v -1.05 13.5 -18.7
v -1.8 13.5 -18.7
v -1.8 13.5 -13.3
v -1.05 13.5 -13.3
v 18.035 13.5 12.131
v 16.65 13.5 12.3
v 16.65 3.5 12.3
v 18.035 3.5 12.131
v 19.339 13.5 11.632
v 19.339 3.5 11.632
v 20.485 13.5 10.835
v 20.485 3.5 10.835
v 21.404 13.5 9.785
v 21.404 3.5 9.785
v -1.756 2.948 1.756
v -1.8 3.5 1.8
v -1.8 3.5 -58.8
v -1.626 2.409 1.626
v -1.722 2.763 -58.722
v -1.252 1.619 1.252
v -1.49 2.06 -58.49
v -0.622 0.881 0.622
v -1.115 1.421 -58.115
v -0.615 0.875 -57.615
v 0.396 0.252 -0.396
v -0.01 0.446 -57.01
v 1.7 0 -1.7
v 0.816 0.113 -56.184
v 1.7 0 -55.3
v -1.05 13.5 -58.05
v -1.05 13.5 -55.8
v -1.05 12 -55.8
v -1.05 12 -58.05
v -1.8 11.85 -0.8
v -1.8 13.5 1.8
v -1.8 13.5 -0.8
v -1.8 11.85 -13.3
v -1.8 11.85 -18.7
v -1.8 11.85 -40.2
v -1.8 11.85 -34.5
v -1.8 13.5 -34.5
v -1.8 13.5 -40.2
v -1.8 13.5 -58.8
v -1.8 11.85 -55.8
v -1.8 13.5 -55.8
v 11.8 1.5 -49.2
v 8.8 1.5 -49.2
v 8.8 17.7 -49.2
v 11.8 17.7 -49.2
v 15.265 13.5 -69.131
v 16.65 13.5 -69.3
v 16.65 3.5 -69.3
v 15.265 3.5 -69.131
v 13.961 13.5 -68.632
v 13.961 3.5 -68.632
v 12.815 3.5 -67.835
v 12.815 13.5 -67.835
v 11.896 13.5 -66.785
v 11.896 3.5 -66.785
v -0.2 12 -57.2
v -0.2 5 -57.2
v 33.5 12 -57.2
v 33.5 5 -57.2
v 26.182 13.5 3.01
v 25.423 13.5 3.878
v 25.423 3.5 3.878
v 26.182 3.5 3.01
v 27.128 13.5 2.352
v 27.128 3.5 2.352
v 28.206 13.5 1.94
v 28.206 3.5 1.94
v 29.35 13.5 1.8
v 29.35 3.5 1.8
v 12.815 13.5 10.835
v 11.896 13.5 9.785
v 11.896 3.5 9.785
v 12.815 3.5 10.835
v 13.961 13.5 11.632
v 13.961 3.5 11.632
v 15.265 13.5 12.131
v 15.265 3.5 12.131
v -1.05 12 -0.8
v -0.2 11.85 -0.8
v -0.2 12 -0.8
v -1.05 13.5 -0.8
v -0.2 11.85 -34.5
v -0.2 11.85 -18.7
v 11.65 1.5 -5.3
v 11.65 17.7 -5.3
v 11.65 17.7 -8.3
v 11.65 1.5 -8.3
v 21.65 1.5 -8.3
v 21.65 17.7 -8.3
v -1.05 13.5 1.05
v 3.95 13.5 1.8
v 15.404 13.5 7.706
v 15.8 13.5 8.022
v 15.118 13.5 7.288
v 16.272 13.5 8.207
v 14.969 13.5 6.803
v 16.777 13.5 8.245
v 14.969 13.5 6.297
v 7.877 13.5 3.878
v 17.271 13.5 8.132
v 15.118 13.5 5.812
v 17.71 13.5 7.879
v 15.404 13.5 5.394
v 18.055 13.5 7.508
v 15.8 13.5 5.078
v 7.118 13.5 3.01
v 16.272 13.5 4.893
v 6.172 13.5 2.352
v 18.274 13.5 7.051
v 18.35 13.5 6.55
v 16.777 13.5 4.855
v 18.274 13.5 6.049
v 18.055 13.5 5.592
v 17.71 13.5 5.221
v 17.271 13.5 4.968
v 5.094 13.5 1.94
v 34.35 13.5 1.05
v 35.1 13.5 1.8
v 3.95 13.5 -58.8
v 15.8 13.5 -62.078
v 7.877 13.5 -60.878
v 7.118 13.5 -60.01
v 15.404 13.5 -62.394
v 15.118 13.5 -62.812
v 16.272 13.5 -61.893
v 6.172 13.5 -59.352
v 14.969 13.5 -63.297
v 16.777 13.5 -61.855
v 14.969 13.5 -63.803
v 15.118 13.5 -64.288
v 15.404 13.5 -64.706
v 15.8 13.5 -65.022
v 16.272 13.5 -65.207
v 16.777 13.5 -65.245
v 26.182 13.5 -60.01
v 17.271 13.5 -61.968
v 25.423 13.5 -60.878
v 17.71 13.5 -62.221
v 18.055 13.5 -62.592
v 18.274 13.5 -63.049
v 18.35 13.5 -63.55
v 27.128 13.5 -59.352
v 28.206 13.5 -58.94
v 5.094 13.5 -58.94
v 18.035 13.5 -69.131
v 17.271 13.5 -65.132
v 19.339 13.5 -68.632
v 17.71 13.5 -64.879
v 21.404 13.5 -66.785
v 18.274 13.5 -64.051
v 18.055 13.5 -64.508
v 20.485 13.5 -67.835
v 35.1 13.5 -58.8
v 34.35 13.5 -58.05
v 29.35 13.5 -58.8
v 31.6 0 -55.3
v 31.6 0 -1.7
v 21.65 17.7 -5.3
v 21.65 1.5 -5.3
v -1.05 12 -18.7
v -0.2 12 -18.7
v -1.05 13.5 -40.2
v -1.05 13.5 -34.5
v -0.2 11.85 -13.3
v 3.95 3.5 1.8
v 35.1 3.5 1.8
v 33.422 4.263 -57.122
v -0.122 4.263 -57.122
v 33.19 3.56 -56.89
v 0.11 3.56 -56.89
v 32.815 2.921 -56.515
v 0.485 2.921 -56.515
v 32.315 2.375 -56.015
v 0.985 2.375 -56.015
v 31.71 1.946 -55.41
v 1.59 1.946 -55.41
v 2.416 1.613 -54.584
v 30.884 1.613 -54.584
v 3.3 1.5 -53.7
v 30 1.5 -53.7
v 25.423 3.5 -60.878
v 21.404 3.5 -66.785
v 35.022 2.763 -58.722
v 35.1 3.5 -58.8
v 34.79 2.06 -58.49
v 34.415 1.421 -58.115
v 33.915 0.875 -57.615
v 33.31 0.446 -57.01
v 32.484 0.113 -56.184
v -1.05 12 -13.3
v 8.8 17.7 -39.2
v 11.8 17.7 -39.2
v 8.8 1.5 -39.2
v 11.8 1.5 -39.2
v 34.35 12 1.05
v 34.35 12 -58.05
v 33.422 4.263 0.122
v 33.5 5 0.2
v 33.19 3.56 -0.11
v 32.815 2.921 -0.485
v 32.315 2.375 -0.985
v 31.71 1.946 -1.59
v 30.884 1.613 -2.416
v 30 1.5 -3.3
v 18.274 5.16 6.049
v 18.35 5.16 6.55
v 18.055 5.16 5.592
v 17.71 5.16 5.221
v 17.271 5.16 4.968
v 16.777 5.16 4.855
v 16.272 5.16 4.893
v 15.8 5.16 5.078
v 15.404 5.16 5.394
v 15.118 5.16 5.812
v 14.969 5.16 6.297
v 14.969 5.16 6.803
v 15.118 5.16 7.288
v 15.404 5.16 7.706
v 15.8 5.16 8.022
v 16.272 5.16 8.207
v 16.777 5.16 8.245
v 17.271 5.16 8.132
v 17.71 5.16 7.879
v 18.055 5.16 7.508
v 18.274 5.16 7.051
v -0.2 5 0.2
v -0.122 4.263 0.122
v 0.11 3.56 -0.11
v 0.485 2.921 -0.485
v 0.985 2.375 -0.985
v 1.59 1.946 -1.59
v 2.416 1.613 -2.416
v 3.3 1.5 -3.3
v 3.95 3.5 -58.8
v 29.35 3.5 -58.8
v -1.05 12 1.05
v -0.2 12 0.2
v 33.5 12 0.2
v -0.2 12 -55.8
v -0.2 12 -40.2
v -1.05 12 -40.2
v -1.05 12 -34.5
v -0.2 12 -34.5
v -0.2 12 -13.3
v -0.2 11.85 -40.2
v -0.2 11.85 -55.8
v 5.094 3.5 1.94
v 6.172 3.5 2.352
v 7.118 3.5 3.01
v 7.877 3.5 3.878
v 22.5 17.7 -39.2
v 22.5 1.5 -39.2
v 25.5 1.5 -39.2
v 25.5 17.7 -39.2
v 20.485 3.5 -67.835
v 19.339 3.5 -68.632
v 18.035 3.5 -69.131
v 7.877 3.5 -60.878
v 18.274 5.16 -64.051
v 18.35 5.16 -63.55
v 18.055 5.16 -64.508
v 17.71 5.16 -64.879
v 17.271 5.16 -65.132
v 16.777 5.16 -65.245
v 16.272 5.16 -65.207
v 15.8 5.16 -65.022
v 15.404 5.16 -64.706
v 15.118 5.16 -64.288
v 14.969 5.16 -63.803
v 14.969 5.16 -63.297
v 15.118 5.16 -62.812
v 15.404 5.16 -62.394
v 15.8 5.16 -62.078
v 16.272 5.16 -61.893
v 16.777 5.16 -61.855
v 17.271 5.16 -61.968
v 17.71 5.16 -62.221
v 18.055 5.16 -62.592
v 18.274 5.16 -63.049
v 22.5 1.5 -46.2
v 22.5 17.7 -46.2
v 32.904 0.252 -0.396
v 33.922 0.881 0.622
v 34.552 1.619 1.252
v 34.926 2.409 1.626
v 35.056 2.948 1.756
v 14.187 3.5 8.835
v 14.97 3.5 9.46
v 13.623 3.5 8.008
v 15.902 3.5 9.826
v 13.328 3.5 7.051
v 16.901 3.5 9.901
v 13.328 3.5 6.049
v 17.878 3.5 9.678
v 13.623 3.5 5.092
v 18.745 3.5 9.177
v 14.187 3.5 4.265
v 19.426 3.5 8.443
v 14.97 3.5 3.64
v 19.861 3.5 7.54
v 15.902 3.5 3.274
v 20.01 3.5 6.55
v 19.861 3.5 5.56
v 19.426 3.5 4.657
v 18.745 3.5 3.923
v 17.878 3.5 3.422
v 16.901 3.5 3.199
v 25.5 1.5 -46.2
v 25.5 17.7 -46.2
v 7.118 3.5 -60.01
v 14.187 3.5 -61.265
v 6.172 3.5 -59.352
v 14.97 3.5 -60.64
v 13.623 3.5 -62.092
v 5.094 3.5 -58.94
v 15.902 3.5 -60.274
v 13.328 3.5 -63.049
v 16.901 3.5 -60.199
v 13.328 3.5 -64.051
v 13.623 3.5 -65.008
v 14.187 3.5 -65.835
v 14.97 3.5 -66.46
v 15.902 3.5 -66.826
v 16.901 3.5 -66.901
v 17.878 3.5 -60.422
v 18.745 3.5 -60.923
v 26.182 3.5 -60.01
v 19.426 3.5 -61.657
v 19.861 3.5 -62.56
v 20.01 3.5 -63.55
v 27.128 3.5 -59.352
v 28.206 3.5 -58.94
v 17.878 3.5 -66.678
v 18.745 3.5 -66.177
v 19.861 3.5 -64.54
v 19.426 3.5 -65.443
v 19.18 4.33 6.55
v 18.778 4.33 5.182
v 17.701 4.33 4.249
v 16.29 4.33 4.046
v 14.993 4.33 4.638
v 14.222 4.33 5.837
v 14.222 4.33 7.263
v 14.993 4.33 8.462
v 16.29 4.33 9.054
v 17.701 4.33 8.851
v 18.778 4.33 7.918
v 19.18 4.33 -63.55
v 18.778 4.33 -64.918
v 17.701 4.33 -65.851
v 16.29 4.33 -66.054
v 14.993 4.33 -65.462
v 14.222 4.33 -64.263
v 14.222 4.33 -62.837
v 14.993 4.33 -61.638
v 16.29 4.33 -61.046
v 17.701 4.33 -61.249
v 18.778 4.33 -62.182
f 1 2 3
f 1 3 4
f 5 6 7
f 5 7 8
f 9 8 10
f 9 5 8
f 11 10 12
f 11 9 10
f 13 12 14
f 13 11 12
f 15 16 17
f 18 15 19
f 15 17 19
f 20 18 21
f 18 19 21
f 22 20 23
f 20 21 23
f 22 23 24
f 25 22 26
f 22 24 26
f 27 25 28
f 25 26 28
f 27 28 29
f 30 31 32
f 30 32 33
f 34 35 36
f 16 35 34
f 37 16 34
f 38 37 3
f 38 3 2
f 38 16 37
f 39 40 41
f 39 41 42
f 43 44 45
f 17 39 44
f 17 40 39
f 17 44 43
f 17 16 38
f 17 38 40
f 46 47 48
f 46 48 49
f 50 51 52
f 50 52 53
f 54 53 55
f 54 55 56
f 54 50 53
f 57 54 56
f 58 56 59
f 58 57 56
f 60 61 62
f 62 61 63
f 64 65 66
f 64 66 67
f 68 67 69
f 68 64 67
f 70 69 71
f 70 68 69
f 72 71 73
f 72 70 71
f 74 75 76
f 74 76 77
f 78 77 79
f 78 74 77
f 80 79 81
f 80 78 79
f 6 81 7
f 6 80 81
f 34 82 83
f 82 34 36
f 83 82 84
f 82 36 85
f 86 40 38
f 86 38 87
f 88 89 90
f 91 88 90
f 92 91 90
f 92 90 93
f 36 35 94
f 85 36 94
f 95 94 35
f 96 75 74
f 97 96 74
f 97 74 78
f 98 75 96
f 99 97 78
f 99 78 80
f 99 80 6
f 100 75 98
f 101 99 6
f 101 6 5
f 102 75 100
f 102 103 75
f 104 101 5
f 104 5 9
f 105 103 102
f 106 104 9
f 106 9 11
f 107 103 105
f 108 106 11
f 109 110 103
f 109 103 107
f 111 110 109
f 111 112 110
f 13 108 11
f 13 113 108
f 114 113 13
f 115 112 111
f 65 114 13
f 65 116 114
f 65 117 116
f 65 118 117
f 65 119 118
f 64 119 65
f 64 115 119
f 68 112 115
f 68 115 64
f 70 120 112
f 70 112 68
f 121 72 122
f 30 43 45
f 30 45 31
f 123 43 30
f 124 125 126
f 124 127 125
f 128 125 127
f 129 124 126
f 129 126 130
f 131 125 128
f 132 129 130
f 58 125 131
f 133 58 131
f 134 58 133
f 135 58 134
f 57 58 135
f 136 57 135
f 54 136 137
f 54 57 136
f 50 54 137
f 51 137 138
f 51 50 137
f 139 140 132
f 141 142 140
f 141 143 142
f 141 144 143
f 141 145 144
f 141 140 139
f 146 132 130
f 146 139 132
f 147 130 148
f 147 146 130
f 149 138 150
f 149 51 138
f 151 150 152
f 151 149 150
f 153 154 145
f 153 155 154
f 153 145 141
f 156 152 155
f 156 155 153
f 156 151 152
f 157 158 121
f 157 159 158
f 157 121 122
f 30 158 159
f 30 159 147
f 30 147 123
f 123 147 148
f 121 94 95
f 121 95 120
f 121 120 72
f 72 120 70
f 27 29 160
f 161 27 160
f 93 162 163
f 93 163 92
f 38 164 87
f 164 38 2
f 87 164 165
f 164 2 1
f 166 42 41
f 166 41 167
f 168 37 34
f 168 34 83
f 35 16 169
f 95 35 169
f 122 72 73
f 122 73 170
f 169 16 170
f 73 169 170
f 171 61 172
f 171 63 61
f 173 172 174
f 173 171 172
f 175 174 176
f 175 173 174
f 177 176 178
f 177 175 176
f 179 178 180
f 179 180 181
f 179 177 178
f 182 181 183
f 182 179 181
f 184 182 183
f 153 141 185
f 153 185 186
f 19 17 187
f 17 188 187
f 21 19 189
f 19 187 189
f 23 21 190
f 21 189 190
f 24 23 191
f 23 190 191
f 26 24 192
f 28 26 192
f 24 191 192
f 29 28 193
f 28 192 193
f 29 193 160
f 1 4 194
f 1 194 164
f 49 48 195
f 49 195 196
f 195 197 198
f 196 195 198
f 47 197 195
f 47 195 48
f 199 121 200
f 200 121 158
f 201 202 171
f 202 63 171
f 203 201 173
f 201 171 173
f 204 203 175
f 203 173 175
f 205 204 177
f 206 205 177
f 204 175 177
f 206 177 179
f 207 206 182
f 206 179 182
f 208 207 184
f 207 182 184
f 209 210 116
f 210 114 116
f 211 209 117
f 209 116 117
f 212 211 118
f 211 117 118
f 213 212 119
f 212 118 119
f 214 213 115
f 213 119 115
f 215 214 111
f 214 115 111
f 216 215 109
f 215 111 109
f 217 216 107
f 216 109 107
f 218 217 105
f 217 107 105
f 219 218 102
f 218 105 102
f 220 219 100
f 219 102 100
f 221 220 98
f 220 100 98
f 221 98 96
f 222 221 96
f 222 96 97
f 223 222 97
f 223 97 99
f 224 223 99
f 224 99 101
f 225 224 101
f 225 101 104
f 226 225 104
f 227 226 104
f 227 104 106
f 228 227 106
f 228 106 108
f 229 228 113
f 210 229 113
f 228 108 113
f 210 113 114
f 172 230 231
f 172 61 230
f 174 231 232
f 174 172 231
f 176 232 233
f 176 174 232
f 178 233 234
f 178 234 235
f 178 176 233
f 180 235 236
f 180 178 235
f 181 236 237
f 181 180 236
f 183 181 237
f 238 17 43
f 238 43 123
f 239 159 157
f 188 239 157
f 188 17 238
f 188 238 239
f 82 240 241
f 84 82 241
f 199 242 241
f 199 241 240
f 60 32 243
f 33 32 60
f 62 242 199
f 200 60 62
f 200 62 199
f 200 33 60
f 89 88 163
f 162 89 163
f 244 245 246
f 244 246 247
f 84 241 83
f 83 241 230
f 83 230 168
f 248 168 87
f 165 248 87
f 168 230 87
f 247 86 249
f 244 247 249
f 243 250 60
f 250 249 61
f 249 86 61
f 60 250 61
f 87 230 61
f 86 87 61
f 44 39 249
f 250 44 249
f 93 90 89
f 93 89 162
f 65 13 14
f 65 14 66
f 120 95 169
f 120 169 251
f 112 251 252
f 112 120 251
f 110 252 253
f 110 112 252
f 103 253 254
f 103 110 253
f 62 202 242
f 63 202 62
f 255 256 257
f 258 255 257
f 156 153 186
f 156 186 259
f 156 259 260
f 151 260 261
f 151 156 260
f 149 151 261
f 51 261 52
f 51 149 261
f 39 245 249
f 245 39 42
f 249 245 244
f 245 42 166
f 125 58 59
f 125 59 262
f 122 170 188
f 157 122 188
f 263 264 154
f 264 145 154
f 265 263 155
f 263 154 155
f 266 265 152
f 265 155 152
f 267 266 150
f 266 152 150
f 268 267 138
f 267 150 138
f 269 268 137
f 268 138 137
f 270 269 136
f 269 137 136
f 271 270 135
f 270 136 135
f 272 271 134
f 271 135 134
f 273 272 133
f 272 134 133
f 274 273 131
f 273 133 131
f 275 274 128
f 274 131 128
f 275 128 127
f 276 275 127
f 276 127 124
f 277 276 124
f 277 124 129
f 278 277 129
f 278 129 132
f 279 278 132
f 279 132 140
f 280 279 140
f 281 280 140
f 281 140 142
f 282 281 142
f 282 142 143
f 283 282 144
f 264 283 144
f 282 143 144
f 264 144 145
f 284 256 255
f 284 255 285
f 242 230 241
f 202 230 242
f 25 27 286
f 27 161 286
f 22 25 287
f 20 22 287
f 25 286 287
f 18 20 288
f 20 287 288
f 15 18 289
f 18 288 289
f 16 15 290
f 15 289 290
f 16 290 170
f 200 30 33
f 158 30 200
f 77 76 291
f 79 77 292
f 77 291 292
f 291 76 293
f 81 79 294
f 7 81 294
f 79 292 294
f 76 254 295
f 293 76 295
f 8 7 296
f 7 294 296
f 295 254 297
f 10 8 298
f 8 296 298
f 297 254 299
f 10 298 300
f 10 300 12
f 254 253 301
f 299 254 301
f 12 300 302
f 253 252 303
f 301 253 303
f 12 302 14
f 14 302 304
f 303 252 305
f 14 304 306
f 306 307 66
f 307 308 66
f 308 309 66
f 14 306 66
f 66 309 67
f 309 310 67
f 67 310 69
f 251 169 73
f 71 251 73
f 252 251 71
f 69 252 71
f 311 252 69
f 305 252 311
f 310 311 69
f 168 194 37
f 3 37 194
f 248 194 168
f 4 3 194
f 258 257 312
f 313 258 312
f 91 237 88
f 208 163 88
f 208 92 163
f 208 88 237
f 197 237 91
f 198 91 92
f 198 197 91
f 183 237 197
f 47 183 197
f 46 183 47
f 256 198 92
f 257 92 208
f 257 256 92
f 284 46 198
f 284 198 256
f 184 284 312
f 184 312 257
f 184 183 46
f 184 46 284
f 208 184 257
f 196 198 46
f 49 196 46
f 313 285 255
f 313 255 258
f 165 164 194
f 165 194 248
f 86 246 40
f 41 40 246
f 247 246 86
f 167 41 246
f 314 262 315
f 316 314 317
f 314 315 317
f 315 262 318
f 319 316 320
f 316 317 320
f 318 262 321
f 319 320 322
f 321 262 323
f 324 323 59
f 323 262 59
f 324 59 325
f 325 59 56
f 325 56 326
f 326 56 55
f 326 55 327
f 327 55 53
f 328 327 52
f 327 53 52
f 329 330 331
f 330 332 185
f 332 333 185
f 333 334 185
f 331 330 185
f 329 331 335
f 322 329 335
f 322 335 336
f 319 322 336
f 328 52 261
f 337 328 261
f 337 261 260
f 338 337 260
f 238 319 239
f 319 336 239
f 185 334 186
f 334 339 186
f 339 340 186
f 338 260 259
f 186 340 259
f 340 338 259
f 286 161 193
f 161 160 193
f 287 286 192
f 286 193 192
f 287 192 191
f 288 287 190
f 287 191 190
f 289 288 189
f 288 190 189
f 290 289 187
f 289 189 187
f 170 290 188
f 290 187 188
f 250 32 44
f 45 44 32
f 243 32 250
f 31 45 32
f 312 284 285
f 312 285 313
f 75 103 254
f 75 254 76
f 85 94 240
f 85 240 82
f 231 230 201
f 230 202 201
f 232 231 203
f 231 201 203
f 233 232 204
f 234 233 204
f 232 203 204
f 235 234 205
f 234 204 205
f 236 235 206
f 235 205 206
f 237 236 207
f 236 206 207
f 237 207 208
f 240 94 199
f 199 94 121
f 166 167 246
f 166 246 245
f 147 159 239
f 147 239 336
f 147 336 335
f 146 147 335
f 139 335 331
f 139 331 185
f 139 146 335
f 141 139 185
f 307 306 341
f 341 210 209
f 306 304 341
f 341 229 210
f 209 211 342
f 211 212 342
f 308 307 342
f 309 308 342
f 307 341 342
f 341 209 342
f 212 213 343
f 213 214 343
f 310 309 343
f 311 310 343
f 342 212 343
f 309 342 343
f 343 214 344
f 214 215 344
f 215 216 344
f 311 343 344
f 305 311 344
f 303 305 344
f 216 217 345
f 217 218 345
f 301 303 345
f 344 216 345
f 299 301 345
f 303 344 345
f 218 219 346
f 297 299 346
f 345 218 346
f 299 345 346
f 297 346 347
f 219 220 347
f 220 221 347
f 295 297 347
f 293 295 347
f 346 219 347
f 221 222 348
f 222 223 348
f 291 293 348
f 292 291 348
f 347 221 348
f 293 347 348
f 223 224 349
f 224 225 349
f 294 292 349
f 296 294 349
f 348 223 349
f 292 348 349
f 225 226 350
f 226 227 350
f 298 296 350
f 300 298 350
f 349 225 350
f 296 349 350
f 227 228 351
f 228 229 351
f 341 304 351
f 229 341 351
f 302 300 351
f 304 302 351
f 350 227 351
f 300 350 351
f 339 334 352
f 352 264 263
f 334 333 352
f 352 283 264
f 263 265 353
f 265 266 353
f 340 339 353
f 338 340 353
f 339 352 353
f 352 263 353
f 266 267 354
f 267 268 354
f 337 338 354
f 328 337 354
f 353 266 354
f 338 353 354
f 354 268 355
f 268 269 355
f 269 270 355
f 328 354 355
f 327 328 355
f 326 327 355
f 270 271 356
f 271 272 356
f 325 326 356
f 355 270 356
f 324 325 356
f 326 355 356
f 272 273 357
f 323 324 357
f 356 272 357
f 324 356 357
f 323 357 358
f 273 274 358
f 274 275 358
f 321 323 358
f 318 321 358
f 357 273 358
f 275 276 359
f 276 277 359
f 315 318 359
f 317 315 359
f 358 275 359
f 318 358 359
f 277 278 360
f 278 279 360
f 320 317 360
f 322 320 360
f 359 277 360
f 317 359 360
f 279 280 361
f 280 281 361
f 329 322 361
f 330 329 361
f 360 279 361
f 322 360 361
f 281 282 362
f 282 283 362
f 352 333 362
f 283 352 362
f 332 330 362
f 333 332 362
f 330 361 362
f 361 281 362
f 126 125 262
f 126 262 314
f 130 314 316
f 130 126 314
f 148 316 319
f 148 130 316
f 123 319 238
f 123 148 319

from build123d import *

# Parameters (mm, degrees)
SKETCH_2_W                  = 36.9
SKETCH_2_H                  = 60.6
SKETCH_2_W_2                = 33.7
SKETCH_2_H_2                = 57.4
SKETCH_2_W_3                = 35.4
SKETCH_2_H_3                = 59.1
SKETCH_2_R                  = 3.75
SKETCH_2_R_2                = 2.25
SKETCH_2_R_3                = 0.75
EXTRUDE_1_DEPTH             = 1.5
EXTRUDE_START               = 1.5
SKETCH_2_20_W               = 36.9
SKETCH_2_20_H               = 60.6
SKETCH_2_20_W_2             = 35.4
SKETCH_2_20_H_2             = 59.1
SKETCH_2_20_W_3             = 33.7
SKETCH_2_20_H_3             = 57.4
EXTRUDE_9_DEPTH             = 12
CUT_EXTRUDE_START           = 13.5
SKETCH_2_21_W               = 35.4
SKETCH_2_21_H               = 59.1
SKETCH_2_21_W_2             = 33.7
SKETCH_2_21_H_2             = 57.4
CUT_EXTRUDE_3_DEPTH         = 1.5
EXTRUDE_START_2             = 13.5
SKETCH_2_23_R               = 3
SKETCH_2_23_R_2             = 1.6
EXTRUDE_10_DEPTH            = 10
FILLET_2_R                  = 3.5
HOLE_WIZARD_M32_D           = 3.4
HOLE_WIZARD_M32_CSINK_D     = 6.72
HOLE_WIZARD_M32_CSINK_ANGLE = 90
SKETCH_12_W                 = 1.6
SKETCH_12_H                 = 15.6
SKETCH_12_H_2               = 15.8
SKETCH_12_H_3               = 12.5
CUT_EXTRUDE_4_DEPTH         = 1.65
SKETCH_13_W                 = 3
SKETCH_13_H                 = 10
SKETCH_13_H_2               = 7
SKETCH_13_W_2               = 10
SKETCH_13_H_3               = 3
EXTRUDE_11_DEPTH            = 16.2


with BuildPart() as part:
    # Эскиз2 → Бобышка-Вытянуть1 (new body)
    # profile 1 of 15: a face of its own
    with BuildSketch(Plane(origin=(0, 0, 0), x_dir=(1, 0, 0), z_dir=(0, 1, 0))):
        with Locations((16.65, 28.5)):
            Rectangle(SKETCH_2_W, SKETCH_2_H)
        with Locations((16.65, 28.5)):
            Rectangle(SKETCH_2_W_2, SKETCH_2_H_2, mode=Mode.SUBTRACT)
    # profile 2 of 15: a face of its own
    with BuildSketch(Plane(origin=(0, 0, 0), x_dir=(1, 0, 0), z_dir=(0, 1, 0))):
        with Locations((16.65, 28.5)):
            Rectangle(SKETCH_2_W_3, SKETCH_2_H_3)
        with Locations((16.65, 28.5)):
            Rectangle(SKETCH_2_W_2, SKETCH_2_H_2, mode=Mode.SUBTRACT)
    # profile 3 of 15: a face of its own
    with BuildSketch(Plane(origin=(0, 0, 0), x_dir=(1, 0, 0), z_dir=(0, 1, 0))):
        with BuildLine():
            Line((-0.2, 57.2), (-0.2, -0.2))
            Line((-0.2, -0.2), (33.5, -0.2))
            Line((33.5, -0.2), (33.5, 10.050490243))
            ThreePointArc((33.5, 10.050490243), (27, 12.6), (33.5, 15.149509757))
            Line((33.5, 15.149509757), (33.5, 57.2))
            Line((33.5, 57.2), (-0.2, 57.2))
        make_face()
        with Locations((5.1, 19.73)):
            Circle(SKETCH_2_R, mode=Mode.SUBTRACT)
        with Locations((5.1, 41.13)):
            Circle(SKETCH_2_R, mode=Mode.SUBTRACT)
        with Locations((23.55, 45)):
            Circle(SKETCH_2_R, mode=Mode.SUBTRACT)
    # profile 4 of 15: a face of its own
    with BuildSketch(Plane(origin=(0, 0, 0), x_dir=(1, 0, 0), z_dir=(0, 1, 0))):
        with Locations((23.55, 45)):
            Circle(SKETCH_2_R)
        with Locations((23.55, 45)):
            Circle(SKETCH_2_R_2, mode=Mode.SUBTRACT)
    # profile 5 of 15: a face of its own
    with BuildSketch(Plane(origin=(0, 0, 0), x_dir=(1, 0, 0), z_dir=(0, 1, 0))):
        with Locations((23.55, 45)):
            Circle(SKETCH_2_R_2)
        with Locations((23.55, 45)):
            Circle(SKETCH_2_R_3, mode=Mode.SUBTRACT)
    # profile 6 of 15: a face of its own
    with BuildSketch(Plane(origin=(0, 0, 0), x_dir=(1, 0, 0), z_dir=(0, 1, 0))):
        with Locations((23.55, 45)):
            Circle(SKETCH_2_R_3)
    # profile 7 of 15: a face of its own
    with BuildSketch(Plane(origin=(0, 0, 0), x_dir=(1, 0, 0), z_dir=(0, 1, 0))):
        with Locations((5.1, 41.13)):
            Circle(SKETCH_2_R)
        with Locations((5.1, 41.13)):
            Circle(SKETCH_2_R_2, mode=Mode.SUBTRACT)
    # profile 8 of 15: a face of its own
    with BuildSketch(Plane(origin=(0, 0, 0), x_dir=(1, 0, 0), z_dir=(0, 1, 0))):
        with Locations((5.1, 41.13)):
            Circle(SKETCH_2_R_2)
        with Locations((5.1, 41.13)):
            Circle(SKETCH_2_R_3, mode=Mode.SUBTRACT)
    # profile 9 of 15: a face of its own
    with BuildSketch(Plane(origin=(0, 0, 0), x_dir=(1, 0, 0), z_dir=(0, 1, 0))):
        with Locations((5.1, 41.13)):
            Circle(SKETCH_2_R_3)
    # profile 10 of 15: a face of its own
    with BuildSketch(Plane(origin=(0, 0, 0), x_dir=(1, 0, 0), z_dir=(0, 1, 0))):
        with Locations((5.1, 19.73)):
            Circle(SKETCH_2_R)
        with Locations((5.1, 19.73)):
            Circle(SKETCH_2_R_2, mode=Mode.SUBTRACT)
    # profile 11 of 15: a face of its own
    with BuildSketch(Plane(origin=(0, 0, 0), x_dir=(1, 0, 0), z_dir=(0, 1, 0))):
        with Locations((5.1, 19.73)):
            Circle(SKETCH_2_R_2)
        with Locations((5.1, 19.73)):
            Circle(SKETCH_2_R_3, mode=Mode.SUBTRACT)
    # profile 12 of 15: a face of its own
    with BuildSketch(Plane(origin=(0, 0, 0), x_dir=(1, 0, 0), z_dir=(0, 1, 0))):
        with Locations((5.1, 19.73)):
            Circle(SKETCH_2_R_3)
    # profile 13 of 15: a face of its own
    with BuildSketch(Plane(origin=(0, 0, 0), x_dir=(1, 0, 0), z_dir=(0, 1, 0))):
        with BuildLine():
            ThreePointArc((33.5, 15.149509757), (27, 12.6), (33.5, 10.050490243))
            Line((33.5, 10.050490243), (33.5, 15.149509757))
        make_face()
        with Locations((30.75, 12.6)):
            Circle(SKETCH_2_R_2, mode=Mode.SUBTRACT)
    # profile 14 of 15: a face of its own
    with BuildSketch(Plane(origin=(0, 0, 0), x_dir=(1, 0, 0), z_dir=(0, 1, 0))):
        with Locations((30.75, 12.6)):
            Circle(SKETCH_2_R_2)
        with Locations((30.75, 12.6)):
            Circle(SKETCH_2_R_3, mode=Mode.SUBTRACT)
    # profile 15 of 15: a face of its own
    with BuildSketch(Plane(origin=(0, 0, 0), x_dir=(1, 0, 0), z_dir=(0, 1, 0))):
        with Locations((30.75, 12.6)):
            Circle(SKETCH_2_R_3)
    extrude(amount=EXTRUDE_1_DEPTH)

    # Эскиз2<20> → Бобышка-Вытянуть9 (add)
    # profile 1 of 2: a face of its own
    with BuildSketch(Plane(origin=(0, 0, 0), x_dir=(1, 0, 0), z_dir=(0, 1, 0)).offset(EXTRUDE_START)):
        with Locations((16.65, 28.5)):
            Rectangle(SKETCH_2_20_W, SKETCH_2_20_H)
        with Locations((16.65, 28.5)):
            Rectangle(SKETCH_2_20_W_2, SKETCH_2_20_H_2, mode=Mode.SUBTRACT)
    # profile 2 of 2: a face of its own
    with BuildSketch(Plane(origin=(0, 0, 0), x_dir=(1, 0, 0), z_dir=(0, 1, 0)).offset(EXTRUDE_START)):
        with Locations((16.65, 28.5)):
            Rectangle(SKETCH_2_20_W_2, SKETCH_2_20_H_2)
        with Locations((16.65, 28.5)):
            Rectangle(SKETCH_2_20_W_3, SKETCH_2_20_H_3, mode=Mode.SUBTRACT)
    extrude(amount=EXTRUDE_9_DEPTH)

    # Эскиз2<21> → Вырез-Вытянуть3 (cut)
    with BuildSketch(Plane(origin=(0, 0, 0), x_dir=(1, 0, 0), z_dir=(0, 1, 0)).offset(CUT_EXTRUDE_START)):
        with Locations((16.65, 28.5)):
            Rectangle(SKETCH_2_21_W, SKETCH_2_21_H)
        with Locations((16.65, 28.5)):
            Rectangle(SKETCH_2_21_W_2, SKETCH_2_21_H_2, mode=Mode.SUBTRACT)
    extrude(amount=-CUT_EXTRUDE_3_DEPTH, mode=Mode.SUBTRACT)

    # Эскиз2<23> → Бобышка-Вытянуть10 (add)
    # profile 1 of 4: a face of its own
    with BuildSketch(Plane(origin=(0, 0, 0), x_dir=(1, 0, 0), z_dir=(0, 1, 0)).offset(EXTRUDE_START_2)):
        with BuildLine():
            ThreePointArc((7.877165354, 60.877946056), (6.171513422, 59.351502874), (3.95, 58.8))
            Line((3.95, 58.8), (29.35, 58.8))
            ThreePointArc((29.35, 58.8), (27.128486578, 59.351502874), (25.422834646, 60.877946056))
            Line((25.422834646, 60.877946056), (21.403937008, 66.784591616))
            ThreePointArc((21.403937008, 66.784591616), (19.339200458, 68.632391258), (16.65, 69.3))
            ThreePointArc((16.65, 69.3), (13.960799542, 68.632391258), (11.896062992, 66.784591616))
            Line((11.896062992, 66.784591616), (7.877165354, 60.877946056))
        make_face()
        with Locations((16.65, 63.55)):
            Circle(SKETCH_2_23_R, mode=Mode.SUBTRACT)
    # profile 2 of 4: a face of its own
    with BuildSketch(Plane(origin=(0, 0, 0), x_dir=(1, 0, 0), z_dir=(0, 1, 0)).offset(EXTRUDE_START_2)):
        with Locations((16.65, 63.55)):
            Circle(SKETCH_2_23_R)
        with Locations(Location((16.65, 63.55, 0), (0, 0, 90))):
            Circle(SKETCH_2_23_R_2, mode=Mode.SUBTRACT)
    # profile 3 of 4: a face of its own
    with BuildSketch(Plane(origin=(0, 0, 0), x_dir=(1, 0, 0), z_dir=(0, 1, 0)).offset(EXTRUDE_START_2)):
        with BuildLine():
            Line((29.35, -1.8), (3.95, -1.8))
            ThreePointArc((3.95, -1.8), (6.171513422, -2.351502874), (7.877165354, -3.877946056))
            Line((7.877165354, -3.877946056), (11.896062992, -9.784591616))
            ThreePointArc((11.896062992, -9.784591616), (13.960799542, -11.632391258), (16.65, -12.3))
            ThreePointArc((16.65, -12.3), (19.339200458, -11.632391258), (21.403937008, -9.784591616))
            Line((21.403937008, -9.784591616), (25.422834646, -3.877946056))
            ThreePointArc((25.422834646, -3.877946056), (27.128486578, -2.351502874), (29.35, -1.8))
        make_face()
        with Locations((16.65, -6.55)):
            Circle(SKETCH_2_23_R, mode=Mode.SUBTRACT)
    # profile 4 of 4: a face of its own
    with BuildSketch(Plane(origin=(0, 0, 0), x_dir=(1, 0, 0), z_dir=(0, 1, 0)).offset(EXTRUDE_START_2)):
        with Locations((16.65, -6.55)):
            Circle(SKETCH_2_23_R)
        with Locations(Location((16.65, -6.55, 0), (0, 0, 90))):
            Circle(SKETCH_2_23_R_2, mode=Mode.SUBTRACT)
    extrude(amount=-EXTRUDE_10_DEPTH)

    # Скругление2
    fillet_2_edges = [part.edges().sort_by_distance(p)[0] for p in [
        (16.65, 1.5, -57.2),
        (-0.2, 1.5, -28.5),
        (33.5, 1.5, -28.5),
        (16.65, 1.5, 0.2),
        (16.65, 0, -58.8),
        (35.1, 0, -28.5),
        (16.65, 0, 1.8),
        (-1.8, 0, -28.5),
    ]]
    fillet(fillet_2_edges, radius=FILLET_2_R - 0.0001)  # a hair under: the kernel refuses the full size

    # Зенковка для  винта с потайной головкой с внутренним шестигранником M32 (through all)
    with Locations(Plane(origin=(0, 3.5, 0), x_dir=(-1, 0, 0), z_dir=(0, -1, 0))):
        with Locations((-16.65, 63.55), (-16.65, -6.55)):
            CounterSinkHole(HOLE_WIZARD_M32_D / 2, HOLE_WIZARD_M32_CSINK_D / 2, counter_sink_angle=HOLE_WIZARD_M32_CSINK_ANGLE)

    # Эскиз12 → Вырез-Вытянуть4 (cut)
    with BuildSketch(Plane(origin=(0, 13.5, 0), x_dir=(1, 0, 0), z_dir=(0, 1, 0))):
        with Locations((-1, 48)):
            Rectangle(SKETCH_12_W, SKETCH_12_H)
        with Locations((-1, 26.6)):
            Rectangle(SKETCH_12_W, SKETCH_12_H_2)
        with Locations((-1, 7.05)):
            Rectangle(SKETCH_12_W, SKETCH_12_H_3)
    extrude(amount=-CUT_EXTRUDE_4_DEPTH, mode=Mode.SUBTRACT)

    # Эскиз13 → Бобышка-Вытянуть11 (add)
    with BuildSketch(Plane(origin=(0, 1.5, 0), x_dir=(1, 0, 0), z_dir=(0, 1, 0))):
        with Locations((10.3, 44.2)):
            Rectangle(SKETCH_13_W, SKETCH_13_H)
        with Locations((24, 42.7)):
            Rectangle(SKETCH_13_W, SKETCH_13_H_2)
        with Locations((16.65, 6.8)):
            Rectangle(SKETCH_13_W_2, SKETCH_13_H_3)
    extrude(amount=EXTRUDE_11_DEPTH)


solid = part.part
